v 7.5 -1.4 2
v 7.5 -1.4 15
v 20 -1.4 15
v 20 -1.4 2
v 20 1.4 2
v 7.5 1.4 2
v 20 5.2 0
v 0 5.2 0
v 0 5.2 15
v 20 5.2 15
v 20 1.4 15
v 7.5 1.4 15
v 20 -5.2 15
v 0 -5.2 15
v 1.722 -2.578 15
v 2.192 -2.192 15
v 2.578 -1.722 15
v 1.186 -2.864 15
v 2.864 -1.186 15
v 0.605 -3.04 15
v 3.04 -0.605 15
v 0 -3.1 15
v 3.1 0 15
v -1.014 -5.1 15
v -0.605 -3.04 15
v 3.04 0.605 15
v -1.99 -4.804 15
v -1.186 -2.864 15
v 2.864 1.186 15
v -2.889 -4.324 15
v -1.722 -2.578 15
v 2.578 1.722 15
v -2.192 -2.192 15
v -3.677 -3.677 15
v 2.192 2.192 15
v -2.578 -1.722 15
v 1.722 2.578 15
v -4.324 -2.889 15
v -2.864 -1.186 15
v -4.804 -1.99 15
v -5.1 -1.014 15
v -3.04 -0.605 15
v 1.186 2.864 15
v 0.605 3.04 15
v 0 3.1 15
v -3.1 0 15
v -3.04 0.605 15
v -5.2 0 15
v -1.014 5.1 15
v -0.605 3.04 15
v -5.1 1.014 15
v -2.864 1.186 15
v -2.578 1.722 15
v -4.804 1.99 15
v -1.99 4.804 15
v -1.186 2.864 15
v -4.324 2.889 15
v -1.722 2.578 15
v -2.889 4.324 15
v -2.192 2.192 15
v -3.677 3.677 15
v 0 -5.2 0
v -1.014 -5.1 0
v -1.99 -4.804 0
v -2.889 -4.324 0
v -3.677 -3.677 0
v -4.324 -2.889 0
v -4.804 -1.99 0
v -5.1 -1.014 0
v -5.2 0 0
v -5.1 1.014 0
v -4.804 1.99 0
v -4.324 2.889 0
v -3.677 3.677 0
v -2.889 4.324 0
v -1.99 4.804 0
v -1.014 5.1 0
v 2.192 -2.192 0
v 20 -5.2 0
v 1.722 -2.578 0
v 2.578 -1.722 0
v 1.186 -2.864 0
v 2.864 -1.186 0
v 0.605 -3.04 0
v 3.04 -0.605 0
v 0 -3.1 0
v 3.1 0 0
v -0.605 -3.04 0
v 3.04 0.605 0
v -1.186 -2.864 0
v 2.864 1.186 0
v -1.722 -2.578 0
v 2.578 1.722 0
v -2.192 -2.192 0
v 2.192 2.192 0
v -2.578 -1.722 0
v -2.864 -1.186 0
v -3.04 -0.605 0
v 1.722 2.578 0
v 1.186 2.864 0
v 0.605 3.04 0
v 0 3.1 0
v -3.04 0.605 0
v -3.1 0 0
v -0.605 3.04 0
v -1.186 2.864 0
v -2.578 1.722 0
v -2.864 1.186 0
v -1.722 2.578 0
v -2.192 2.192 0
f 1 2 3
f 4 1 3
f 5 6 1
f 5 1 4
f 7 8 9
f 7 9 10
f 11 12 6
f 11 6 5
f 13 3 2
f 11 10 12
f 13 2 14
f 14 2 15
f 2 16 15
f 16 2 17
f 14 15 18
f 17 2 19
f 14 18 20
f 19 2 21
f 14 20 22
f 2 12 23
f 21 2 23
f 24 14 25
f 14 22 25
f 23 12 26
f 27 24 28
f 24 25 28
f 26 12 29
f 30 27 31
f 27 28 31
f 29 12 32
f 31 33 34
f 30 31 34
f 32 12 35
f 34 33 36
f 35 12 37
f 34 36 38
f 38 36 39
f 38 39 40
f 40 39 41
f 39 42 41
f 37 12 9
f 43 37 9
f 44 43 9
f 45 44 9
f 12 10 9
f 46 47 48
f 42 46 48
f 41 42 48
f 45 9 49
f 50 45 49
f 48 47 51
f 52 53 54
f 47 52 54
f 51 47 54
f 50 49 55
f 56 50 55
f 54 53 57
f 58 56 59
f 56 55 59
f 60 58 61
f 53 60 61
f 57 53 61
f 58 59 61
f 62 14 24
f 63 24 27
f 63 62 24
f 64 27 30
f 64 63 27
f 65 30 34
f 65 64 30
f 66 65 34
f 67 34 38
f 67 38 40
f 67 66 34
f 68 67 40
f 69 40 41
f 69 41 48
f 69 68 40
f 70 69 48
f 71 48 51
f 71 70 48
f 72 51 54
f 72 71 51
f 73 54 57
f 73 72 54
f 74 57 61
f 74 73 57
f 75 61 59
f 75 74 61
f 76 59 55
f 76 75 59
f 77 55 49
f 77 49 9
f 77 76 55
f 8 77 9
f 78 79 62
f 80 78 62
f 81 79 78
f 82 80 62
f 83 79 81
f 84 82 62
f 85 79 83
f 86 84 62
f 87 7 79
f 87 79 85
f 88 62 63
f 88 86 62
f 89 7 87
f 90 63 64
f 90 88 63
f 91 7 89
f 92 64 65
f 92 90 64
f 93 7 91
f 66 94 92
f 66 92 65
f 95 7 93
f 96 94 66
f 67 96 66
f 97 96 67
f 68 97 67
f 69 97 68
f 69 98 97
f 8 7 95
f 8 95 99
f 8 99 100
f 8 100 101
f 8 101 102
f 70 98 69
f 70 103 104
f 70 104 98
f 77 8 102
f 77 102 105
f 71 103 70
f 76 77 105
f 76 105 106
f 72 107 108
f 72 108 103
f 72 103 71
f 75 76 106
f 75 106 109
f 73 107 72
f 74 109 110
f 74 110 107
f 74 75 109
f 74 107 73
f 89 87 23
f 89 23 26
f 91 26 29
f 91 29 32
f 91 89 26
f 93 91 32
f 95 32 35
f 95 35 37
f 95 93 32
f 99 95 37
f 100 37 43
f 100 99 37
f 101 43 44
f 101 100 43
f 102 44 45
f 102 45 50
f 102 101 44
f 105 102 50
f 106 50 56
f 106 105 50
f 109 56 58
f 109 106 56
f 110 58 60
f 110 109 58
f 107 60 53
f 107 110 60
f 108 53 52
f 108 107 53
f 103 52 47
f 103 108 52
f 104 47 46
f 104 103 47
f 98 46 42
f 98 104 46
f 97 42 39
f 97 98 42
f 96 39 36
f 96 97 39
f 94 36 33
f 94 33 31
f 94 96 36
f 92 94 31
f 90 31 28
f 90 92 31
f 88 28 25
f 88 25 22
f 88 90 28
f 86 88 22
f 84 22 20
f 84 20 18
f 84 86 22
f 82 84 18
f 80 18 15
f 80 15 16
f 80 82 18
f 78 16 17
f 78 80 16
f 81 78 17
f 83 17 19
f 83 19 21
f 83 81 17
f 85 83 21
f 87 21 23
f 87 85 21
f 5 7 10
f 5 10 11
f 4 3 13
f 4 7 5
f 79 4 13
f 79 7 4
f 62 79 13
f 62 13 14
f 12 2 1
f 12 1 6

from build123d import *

# Parameters (mm, degrees)
CROQUIS1_R              = 3.1
SALIENTE_EXTRUIR1_DEPTH = 15
CROQUIS2_W              = 12.5
CROQUIS2_H              = 2.8
CORTAR_EXTRUIR1_DEPTH   = 13


with BuildPart() as part:
    # Croquis1 → Saliente-Extruir1 (new body)
    with BuildSketch(Plane.XY):
        with BuildLine():
            Line((0, 5.2), (20, 5.2))
            Line((20, 5.2), (20, -5.2))
            Line((20, -5.2), (0, -5.2))
            ThreePointArc((0, -5.2), (-5.2, 0), (0, 5.2))
        make_face()
        Circle(CROQUIS1_R, mode=Mode.SUBTRACT)
    extrude(amount=SALIENTE_EXTRUIR1_DEPTH)

    # Croquis2 → Cortar-Extruir1 (cut)
    with BuildSketch(Plane.XY.offset(15)):
        with Locations((13.75, 0)):
            Rectangle(CROQUIS2_W, CROQUIS2_H)
    extrude(amount=-CORTAR_EXTRUIR1_DEPTH, mode=Mode.SUBTRACT)


solid = part.part
